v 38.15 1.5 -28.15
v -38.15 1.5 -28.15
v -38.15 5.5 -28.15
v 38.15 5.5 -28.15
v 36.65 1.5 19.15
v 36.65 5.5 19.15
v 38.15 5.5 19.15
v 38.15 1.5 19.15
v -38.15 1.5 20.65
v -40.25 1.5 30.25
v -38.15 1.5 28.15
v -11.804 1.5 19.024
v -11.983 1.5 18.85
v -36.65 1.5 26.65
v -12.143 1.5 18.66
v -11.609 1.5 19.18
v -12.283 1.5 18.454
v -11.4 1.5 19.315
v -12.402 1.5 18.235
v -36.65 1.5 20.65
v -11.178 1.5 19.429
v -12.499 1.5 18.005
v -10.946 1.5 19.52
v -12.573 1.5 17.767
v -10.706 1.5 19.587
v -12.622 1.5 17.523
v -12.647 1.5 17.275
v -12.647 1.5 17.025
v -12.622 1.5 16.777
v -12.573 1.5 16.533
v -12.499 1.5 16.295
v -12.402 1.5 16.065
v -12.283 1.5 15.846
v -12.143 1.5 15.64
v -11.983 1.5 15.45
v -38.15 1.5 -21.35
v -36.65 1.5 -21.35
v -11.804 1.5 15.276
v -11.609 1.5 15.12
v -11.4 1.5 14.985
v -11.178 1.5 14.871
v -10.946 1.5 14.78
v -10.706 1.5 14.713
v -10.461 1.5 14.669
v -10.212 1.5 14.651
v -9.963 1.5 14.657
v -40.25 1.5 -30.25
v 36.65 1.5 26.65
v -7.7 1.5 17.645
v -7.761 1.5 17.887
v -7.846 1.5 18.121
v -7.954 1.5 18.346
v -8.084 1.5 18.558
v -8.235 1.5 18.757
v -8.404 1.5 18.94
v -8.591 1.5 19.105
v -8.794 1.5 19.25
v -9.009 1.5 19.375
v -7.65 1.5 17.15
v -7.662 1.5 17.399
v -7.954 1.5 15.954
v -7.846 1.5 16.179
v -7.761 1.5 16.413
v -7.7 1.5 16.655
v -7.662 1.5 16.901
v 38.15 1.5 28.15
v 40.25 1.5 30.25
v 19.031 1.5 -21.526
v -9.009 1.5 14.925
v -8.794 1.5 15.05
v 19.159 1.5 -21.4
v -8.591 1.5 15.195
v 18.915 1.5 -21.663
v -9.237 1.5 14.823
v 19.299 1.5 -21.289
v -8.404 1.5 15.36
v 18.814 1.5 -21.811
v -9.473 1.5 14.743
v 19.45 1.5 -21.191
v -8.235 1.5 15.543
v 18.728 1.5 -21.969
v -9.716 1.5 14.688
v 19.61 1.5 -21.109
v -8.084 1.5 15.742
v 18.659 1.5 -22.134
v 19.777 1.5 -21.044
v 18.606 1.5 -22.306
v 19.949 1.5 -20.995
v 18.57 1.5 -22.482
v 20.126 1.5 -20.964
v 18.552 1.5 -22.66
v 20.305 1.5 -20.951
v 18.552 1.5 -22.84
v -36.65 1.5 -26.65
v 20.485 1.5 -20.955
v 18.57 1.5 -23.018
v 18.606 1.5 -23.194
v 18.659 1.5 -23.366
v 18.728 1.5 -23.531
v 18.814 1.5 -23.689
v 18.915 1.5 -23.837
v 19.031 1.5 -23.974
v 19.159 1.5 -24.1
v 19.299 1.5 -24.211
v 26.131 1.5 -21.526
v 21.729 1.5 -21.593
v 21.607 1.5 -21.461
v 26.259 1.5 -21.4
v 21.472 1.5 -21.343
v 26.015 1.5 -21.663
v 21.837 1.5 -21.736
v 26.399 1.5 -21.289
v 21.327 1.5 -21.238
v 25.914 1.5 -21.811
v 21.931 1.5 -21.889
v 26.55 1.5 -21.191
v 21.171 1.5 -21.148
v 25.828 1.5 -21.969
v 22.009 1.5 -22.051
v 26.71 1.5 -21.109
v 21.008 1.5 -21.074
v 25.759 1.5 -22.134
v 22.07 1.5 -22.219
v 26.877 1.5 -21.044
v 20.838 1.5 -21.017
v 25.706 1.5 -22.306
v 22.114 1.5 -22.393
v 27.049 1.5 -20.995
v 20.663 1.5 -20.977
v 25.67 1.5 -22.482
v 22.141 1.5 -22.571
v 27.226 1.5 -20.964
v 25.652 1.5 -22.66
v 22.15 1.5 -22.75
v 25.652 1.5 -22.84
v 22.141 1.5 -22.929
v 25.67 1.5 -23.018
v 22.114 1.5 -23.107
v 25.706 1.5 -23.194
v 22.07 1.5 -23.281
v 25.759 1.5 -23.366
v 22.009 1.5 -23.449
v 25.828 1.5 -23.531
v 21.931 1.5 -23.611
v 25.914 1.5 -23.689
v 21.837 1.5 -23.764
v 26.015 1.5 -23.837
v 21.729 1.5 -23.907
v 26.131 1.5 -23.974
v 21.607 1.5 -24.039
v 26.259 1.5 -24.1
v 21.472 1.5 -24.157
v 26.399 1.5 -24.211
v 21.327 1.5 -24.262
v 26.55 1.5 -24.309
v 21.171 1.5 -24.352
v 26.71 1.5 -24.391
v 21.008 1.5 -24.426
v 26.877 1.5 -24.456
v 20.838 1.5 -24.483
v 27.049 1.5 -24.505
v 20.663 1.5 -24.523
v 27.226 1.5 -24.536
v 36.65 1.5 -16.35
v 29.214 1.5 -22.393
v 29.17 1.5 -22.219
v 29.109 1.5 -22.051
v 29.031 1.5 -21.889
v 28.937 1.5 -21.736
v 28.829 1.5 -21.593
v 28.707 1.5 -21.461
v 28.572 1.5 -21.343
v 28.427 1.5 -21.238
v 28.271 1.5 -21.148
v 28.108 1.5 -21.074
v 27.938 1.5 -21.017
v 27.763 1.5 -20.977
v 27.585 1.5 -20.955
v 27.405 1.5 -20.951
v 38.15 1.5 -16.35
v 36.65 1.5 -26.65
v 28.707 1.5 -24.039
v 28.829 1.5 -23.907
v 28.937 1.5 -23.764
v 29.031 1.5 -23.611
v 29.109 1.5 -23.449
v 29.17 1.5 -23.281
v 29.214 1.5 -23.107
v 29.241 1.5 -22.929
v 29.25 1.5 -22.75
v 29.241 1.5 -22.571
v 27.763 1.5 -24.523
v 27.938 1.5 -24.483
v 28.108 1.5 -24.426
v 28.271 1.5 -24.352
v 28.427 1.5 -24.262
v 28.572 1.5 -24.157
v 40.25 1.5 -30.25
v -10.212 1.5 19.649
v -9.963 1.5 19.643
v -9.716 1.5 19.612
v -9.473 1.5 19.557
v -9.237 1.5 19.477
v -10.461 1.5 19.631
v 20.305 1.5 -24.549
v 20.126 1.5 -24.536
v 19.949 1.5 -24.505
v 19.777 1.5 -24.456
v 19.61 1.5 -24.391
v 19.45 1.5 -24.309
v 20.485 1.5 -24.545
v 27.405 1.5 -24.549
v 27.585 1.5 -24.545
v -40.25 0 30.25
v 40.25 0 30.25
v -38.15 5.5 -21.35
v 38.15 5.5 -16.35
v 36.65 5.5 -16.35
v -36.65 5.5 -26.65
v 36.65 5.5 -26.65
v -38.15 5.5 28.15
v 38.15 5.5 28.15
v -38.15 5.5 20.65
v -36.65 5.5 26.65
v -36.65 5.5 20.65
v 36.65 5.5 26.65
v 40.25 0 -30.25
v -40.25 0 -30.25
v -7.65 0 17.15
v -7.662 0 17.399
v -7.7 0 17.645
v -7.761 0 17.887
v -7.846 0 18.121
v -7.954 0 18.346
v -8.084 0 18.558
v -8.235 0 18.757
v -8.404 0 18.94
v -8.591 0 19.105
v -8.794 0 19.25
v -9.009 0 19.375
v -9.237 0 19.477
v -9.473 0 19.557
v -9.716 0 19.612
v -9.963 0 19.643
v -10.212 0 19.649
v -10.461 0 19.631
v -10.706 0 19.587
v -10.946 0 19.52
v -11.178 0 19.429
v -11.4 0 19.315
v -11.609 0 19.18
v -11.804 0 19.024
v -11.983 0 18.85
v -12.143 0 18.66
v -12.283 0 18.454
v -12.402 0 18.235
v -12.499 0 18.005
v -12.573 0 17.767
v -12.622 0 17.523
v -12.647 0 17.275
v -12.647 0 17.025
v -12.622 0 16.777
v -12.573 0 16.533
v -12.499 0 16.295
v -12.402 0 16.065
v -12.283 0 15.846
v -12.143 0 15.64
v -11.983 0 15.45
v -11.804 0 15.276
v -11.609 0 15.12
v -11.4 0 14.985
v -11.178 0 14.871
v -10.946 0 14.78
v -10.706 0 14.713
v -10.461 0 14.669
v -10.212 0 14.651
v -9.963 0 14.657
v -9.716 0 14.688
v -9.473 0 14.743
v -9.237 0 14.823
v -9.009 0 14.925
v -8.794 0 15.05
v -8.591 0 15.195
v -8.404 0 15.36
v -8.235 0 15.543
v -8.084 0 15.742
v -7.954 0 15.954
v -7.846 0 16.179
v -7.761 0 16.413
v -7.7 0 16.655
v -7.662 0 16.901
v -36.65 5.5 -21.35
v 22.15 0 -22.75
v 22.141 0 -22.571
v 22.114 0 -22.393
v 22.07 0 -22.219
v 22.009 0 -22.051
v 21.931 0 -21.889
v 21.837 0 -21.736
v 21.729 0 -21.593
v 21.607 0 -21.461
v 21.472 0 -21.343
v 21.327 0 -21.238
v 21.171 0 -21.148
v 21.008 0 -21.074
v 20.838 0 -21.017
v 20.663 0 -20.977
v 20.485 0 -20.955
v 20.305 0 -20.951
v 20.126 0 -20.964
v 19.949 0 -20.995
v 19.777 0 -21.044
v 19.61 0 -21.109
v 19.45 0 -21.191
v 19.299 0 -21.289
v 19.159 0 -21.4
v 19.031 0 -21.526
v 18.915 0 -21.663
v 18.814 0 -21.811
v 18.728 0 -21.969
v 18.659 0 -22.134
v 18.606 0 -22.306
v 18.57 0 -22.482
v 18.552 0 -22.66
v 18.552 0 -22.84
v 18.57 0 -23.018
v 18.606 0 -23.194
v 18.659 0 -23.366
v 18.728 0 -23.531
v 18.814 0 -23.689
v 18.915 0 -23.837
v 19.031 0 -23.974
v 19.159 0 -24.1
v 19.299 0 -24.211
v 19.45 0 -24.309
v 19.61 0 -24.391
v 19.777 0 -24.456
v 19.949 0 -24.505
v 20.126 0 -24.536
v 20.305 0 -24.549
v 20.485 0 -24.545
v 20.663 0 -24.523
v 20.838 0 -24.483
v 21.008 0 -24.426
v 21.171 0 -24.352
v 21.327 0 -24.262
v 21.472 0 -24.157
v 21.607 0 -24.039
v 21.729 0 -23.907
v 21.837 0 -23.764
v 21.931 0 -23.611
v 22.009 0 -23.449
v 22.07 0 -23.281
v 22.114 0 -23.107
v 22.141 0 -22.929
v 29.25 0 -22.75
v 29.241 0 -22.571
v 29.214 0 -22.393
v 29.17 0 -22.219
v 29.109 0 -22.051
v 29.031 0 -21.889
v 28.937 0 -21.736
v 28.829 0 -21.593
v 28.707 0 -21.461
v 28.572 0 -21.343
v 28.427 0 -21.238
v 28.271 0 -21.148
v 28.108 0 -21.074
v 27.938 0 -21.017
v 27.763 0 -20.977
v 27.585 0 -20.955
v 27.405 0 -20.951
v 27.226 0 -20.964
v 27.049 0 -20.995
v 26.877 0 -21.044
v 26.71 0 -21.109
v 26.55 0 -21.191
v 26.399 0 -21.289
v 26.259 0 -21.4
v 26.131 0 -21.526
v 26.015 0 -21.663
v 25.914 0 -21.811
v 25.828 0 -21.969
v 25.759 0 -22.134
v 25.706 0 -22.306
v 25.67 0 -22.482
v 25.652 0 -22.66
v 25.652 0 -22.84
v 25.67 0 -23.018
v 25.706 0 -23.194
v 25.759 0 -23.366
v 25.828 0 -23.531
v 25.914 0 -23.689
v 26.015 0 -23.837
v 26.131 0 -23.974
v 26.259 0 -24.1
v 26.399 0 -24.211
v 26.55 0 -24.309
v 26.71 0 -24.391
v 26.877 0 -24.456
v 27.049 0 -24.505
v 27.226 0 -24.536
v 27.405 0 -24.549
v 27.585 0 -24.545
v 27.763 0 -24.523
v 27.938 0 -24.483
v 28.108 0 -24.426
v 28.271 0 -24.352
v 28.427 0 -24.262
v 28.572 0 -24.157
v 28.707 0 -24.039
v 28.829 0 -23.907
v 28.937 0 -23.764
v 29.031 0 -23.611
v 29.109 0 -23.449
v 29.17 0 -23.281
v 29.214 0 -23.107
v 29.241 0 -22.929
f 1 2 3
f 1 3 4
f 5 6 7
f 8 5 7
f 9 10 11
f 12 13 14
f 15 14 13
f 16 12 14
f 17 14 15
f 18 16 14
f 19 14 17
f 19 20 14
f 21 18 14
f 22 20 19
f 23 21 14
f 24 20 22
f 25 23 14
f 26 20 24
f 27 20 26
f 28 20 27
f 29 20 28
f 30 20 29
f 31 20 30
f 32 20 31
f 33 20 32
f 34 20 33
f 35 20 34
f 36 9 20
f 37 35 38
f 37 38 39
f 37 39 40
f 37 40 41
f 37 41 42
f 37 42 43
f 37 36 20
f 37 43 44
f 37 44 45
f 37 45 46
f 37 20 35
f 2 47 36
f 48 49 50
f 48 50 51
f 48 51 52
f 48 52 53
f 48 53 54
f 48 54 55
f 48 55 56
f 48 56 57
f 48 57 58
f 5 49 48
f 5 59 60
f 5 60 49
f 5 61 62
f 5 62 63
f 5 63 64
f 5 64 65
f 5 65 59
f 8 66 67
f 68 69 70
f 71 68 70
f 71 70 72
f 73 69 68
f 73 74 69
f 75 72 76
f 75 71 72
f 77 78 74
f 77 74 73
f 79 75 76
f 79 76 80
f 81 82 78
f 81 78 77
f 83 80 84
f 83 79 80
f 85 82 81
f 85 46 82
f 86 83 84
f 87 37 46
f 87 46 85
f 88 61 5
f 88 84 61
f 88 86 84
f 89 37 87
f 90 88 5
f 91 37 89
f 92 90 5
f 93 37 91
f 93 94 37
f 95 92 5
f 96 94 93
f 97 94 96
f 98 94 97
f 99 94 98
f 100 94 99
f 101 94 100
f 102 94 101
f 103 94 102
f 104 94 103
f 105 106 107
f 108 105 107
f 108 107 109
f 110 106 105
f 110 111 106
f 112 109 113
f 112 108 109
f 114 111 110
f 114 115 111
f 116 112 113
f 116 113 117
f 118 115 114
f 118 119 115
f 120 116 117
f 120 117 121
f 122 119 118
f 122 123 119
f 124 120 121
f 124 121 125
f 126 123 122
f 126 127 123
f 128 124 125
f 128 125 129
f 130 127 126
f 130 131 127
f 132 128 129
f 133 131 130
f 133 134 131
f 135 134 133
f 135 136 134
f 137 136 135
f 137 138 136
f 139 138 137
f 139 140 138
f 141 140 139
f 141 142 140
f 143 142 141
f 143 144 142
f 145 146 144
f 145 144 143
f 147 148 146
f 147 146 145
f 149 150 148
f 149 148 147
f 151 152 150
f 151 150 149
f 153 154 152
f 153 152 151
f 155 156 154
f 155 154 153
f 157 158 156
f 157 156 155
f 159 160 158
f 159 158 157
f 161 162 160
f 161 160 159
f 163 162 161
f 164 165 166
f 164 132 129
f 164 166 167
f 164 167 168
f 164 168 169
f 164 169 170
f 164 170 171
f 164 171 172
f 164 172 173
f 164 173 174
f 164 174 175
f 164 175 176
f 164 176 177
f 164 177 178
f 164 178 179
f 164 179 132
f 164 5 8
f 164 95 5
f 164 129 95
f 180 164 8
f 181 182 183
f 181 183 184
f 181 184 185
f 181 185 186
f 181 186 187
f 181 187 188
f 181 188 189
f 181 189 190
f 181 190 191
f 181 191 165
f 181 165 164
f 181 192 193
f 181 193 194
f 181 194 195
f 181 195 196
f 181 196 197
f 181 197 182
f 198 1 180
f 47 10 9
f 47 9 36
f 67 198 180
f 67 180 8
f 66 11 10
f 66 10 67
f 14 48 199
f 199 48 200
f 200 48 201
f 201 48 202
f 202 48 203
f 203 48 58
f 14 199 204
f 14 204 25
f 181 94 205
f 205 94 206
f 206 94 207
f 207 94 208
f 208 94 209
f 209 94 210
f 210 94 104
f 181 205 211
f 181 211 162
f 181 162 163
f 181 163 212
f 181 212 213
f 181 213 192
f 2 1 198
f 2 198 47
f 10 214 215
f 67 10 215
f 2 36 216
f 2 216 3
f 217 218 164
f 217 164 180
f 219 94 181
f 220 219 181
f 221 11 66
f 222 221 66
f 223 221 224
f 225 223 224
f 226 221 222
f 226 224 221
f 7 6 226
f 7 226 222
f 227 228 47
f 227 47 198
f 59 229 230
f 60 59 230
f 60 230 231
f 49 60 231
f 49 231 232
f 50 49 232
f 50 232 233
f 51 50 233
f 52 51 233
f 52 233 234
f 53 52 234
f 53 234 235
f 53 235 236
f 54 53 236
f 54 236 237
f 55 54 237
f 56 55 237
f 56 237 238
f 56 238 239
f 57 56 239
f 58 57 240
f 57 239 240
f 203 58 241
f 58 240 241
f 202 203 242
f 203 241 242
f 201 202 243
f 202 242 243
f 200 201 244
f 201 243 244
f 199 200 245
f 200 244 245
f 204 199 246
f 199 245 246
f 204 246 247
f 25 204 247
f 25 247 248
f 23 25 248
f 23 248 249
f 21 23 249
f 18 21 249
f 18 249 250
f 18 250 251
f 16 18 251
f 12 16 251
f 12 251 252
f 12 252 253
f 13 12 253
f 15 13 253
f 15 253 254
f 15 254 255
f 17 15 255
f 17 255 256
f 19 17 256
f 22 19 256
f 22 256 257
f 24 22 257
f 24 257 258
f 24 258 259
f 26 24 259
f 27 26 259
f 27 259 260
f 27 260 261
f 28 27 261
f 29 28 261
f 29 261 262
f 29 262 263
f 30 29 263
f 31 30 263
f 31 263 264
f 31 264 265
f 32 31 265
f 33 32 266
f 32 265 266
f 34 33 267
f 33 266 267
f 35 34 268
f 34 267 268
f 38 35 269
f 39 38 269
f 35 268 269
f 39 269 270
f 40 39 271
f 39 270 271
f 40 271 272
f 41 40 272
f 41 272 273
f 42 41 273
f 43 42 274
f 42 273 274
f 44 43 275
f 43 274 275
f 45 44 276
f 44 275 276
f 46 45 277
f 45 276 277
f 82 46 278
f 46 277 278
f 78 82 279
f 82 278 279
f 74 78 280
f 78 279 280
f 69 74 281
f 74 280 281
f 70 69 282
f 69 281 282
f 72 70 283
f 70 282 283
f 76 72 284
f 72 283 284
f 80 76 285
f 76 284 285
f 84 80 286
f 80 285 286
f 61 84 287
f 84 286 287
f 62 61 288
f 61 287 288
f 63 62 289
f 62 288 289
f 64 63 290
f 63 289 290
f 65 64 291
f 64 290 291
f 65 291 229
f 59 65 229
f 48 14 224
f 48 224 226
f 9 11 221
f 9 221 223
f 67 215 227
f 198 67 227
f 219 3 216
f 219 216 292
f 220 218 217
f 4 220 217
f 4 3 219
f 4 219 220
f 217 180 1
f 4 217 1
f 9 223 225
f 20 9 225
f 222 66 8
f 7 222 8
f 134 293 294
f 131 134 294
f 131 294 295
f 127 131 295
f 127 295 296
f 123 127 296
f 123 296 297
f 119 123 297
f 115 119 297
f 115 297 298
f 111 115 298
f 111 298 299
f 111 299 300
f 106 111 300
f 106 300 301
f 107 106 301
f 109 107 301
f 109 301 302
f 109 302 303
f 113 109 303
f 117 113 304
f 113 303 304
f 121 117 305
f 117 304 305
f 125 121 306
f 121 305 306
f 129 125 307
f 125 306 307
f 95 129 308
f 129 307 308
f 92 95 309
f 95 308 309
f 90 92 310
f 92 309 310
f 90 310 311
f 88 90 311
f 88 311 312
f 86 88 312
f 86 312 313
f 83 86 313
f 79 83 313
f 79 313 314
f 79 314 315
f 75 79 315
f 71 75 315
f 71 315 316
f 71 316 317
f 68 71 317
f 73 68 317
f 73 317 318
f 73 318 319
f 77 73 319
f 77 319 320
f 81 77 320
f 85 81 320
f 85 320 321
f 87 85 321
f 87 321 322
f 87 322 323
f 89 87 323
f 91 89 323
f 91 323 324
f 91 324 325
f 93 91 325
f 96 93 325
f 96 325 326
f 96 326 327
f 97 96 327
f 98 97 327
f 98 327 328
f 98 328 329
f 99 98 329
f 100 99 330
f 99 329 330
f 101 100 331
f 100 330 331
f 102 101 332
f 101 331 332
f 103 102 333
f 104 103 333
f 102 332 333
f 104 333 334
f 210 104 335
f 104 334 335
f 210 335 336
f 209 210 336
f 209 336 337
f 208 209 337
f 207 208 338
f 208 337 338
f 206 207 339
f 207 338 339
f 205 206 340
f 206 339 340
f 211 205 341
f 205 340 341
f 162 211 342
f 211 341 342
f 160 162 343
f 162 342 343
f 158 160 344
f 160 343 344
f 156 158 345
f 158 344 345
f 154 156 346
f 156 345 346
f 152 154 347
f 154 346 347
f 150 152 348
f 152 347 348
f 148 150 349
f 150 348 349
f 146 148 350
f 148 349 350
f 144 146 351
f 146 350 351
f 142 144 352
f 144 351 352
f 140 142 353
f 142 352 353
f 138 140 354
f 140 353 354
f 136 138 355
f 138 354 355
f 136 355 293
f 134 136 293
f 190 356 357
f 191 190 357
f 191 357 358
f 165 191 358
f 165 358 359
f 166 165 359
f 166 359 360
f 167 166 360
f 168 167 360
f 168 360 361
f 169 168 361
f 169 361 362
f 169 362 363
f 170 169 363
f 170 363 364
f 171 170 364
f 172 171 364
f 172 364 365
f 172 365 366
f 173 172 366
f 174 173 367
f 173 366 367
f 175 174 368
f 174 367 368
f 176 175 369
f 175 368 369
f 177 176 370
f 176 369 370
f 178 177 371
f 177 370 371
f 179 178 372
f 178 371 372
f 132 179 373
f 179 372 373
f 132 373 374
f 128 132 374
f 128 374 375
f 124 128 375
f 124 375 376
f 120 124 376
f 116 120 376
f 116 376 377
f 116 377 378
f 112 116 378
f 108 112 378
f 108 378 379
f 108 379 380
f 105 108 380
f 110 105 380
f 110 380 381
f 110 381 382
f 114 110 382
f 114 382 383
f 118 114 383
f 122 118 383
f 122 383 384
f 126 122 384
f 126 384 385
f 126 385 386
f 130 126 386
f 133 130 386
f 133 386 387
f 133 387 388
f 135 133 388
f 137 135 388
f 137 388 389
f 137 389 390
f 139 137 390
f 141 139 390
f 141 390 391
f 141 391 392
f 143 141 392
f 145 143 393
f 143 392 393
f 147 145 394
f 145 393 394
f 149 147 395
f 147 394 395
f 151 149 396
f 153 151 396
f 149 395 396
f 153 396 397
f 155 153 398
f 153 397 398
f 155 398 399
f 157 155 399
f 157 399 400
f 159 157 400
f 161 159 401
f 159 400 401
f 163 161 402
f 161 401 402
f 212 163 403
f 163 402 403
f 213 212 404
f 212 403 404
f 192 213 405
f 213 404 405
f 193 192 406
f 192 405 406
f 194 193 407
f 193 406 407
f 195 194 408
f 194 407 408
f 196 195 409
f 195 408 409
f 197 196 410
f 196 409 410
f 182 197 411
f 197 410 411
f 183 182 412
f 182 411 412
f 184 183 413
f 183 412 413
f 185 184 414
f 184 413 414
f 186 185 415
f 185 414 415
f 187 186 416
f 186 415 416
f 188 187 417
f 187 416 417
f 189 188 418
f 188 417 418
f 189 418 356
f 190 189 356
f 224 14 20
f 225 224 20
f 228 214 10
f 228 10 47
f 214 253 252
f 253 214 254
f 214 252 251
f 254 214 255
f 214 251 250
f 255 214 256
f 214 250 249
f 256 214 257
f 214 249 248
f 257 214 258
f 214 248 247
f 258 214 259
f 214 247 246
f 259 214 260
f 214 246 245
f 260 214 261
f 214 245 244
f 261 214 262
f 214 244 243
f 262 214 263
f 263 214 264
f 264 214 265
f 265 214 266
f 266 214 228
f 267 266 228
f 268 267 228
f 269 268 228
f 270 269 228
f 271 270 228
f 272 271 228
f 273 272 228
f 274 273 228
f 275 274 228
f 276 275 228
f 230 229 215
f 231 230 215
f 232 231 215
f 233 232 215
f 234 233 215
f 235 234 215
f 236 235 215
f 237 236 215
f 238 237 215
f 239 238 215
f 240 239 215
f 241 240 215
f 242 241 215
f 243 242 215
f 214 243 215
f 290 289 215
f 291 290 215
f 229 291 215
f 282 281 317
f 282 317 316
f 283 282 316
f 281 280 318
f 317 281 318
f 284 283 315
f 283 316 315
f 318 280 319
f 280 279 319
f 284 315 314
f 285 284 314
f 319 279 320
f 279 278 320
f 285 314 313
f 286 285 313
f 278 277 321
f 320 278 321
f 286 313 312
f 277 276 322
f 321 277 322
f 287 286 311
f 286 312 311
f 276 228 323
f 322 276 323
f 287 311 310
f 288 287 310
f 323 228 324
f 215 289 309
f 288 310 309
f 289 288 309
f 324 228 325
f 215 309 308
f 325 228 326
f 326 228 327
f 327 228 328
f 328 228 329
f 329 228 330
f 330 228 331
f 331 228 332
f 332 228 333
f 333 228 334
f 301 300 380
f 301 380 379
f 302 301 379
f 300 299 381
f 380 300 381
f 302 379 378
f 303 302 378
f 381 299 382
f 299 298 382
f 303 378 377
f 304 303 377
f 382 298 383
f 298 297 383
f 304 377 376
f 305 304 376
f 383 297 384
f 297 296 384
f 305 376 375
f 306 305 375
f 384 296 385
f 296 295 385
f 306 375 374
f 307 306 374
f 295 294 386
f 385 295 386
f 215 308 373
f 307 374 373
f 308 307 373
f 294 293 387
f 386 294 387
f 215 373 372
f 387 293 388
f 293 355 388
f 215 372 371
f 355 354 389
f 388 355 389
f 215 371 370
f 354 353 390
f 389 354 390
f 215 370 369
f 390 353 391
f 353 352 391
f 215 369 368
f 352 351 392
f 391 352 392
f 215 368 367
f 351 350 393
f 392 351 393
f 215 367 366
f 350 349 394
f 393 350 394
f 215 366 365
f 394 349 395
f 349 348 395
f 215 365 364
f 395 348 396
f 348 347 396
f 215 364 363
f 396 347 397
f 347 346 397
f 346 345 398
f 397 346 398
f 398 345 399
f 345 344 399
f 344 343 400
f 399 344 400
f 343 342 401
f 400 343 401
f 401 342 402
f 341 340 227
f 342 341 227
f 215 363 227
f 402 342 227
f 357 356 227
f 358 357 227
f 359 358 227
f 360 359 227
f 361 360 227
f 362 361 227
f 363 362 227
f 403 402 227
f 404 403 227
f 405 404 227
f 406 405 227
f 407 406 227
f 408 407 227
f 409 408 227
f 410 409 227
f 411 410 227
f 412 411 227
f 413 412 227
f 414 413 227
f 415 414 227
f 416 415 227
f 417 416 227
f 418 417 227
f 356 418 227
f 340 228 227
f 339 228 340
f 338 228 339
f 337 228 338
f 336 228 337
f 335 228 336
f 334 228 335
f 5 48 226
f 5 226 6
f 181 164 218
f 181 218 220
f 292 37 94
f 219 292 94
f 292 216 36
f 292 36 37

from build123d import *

# Parameters (mm, degrees)
SKETCH_1_W          = 80.5
SKETCH_1_H          = 60.5
EXTRUDE_1_DEPTH     = 1.5
SKETCH_2_W          = 76.3
SKETCH_2_H          = 56.3
SKETCH_2_W_2        = 73.3
SKETCH_2_H_2        = 53.3
EXTRUDE_2_DEPTH     = 4
SKETCH_4_W          = 2
SKETCH_4_H          = 35.5
SKETCH_4_H_2        = 42
CUT_EXTRUDE_1_DEPTH = 4
SKETCH_5_R          = 1.8
SKETCH_5_R_2        = 2.5
CUT_EXTRUDE_2_DEPTH = 3


with BuildPart() as part:
    # 草图1 → 凸台-拉伸1 (new body)
    with BuildSketch(Plane(origin=(0, 0, 0), x_dir=(1, 0, 0), z_dir=(0, 1, 0))):
        Rectangle(SKETCH_1_W, SKETCH_1_H)
    extrude(amount=EXTRUDE_1_DEPTH)

    # 草图2 → 凸台-拉伸2 (add)
    with BuildSketch(Plane(origin=(0, 1.5, 0), x_dir=(1, 0, 0), z_dir=(0, 1, 0))):
        Rectangle(SKETCH_2_W, SKETCH_2_H)
        Rectangle(SKETCH_2_W_2, SKETCH_2_H_2, mode=Mode.SUBTRACT)
    extrude(amount=EXTRUDE_2_DEPTH)

    # 草图4 → 切除-拉伸1 (cut)
    with BuildSketch(Plane(origin=(0, 5.5, 0), x_dir=(1, 0, 0), z_dir=(0, 1, 0))):
        with Locations((37.4, -1.4)):
            Rectangle(SKETCH_4_W, SKETCH_4_H)
        with Locations((-37.4, 0.35)):
            Rectangle(SKETCH_4_W, SKETCH_4_H_2)
    extrude(amount=-CUT_EXTRUDE_1_DEPTH, mode=Mode.SUBTRACT)

    # 草图5 → 切除-拉伸2 (cut)
    with BuildSketch(Plane.XZ):
        with Locations((20.35, -22.75)):
            Circle(SKETCH_5_R)
        with Locations((27.45, -22.75)):
            Circle(SKETCH_5_R)
        with Locations((-10.15, 17.15)):
            Circle(SKETCH_5_R_2)
    extrude(amount=-CUT_EXTRUDE_2_DEPTH, mode=Mode.SUBTRACT)


solid = part.part
